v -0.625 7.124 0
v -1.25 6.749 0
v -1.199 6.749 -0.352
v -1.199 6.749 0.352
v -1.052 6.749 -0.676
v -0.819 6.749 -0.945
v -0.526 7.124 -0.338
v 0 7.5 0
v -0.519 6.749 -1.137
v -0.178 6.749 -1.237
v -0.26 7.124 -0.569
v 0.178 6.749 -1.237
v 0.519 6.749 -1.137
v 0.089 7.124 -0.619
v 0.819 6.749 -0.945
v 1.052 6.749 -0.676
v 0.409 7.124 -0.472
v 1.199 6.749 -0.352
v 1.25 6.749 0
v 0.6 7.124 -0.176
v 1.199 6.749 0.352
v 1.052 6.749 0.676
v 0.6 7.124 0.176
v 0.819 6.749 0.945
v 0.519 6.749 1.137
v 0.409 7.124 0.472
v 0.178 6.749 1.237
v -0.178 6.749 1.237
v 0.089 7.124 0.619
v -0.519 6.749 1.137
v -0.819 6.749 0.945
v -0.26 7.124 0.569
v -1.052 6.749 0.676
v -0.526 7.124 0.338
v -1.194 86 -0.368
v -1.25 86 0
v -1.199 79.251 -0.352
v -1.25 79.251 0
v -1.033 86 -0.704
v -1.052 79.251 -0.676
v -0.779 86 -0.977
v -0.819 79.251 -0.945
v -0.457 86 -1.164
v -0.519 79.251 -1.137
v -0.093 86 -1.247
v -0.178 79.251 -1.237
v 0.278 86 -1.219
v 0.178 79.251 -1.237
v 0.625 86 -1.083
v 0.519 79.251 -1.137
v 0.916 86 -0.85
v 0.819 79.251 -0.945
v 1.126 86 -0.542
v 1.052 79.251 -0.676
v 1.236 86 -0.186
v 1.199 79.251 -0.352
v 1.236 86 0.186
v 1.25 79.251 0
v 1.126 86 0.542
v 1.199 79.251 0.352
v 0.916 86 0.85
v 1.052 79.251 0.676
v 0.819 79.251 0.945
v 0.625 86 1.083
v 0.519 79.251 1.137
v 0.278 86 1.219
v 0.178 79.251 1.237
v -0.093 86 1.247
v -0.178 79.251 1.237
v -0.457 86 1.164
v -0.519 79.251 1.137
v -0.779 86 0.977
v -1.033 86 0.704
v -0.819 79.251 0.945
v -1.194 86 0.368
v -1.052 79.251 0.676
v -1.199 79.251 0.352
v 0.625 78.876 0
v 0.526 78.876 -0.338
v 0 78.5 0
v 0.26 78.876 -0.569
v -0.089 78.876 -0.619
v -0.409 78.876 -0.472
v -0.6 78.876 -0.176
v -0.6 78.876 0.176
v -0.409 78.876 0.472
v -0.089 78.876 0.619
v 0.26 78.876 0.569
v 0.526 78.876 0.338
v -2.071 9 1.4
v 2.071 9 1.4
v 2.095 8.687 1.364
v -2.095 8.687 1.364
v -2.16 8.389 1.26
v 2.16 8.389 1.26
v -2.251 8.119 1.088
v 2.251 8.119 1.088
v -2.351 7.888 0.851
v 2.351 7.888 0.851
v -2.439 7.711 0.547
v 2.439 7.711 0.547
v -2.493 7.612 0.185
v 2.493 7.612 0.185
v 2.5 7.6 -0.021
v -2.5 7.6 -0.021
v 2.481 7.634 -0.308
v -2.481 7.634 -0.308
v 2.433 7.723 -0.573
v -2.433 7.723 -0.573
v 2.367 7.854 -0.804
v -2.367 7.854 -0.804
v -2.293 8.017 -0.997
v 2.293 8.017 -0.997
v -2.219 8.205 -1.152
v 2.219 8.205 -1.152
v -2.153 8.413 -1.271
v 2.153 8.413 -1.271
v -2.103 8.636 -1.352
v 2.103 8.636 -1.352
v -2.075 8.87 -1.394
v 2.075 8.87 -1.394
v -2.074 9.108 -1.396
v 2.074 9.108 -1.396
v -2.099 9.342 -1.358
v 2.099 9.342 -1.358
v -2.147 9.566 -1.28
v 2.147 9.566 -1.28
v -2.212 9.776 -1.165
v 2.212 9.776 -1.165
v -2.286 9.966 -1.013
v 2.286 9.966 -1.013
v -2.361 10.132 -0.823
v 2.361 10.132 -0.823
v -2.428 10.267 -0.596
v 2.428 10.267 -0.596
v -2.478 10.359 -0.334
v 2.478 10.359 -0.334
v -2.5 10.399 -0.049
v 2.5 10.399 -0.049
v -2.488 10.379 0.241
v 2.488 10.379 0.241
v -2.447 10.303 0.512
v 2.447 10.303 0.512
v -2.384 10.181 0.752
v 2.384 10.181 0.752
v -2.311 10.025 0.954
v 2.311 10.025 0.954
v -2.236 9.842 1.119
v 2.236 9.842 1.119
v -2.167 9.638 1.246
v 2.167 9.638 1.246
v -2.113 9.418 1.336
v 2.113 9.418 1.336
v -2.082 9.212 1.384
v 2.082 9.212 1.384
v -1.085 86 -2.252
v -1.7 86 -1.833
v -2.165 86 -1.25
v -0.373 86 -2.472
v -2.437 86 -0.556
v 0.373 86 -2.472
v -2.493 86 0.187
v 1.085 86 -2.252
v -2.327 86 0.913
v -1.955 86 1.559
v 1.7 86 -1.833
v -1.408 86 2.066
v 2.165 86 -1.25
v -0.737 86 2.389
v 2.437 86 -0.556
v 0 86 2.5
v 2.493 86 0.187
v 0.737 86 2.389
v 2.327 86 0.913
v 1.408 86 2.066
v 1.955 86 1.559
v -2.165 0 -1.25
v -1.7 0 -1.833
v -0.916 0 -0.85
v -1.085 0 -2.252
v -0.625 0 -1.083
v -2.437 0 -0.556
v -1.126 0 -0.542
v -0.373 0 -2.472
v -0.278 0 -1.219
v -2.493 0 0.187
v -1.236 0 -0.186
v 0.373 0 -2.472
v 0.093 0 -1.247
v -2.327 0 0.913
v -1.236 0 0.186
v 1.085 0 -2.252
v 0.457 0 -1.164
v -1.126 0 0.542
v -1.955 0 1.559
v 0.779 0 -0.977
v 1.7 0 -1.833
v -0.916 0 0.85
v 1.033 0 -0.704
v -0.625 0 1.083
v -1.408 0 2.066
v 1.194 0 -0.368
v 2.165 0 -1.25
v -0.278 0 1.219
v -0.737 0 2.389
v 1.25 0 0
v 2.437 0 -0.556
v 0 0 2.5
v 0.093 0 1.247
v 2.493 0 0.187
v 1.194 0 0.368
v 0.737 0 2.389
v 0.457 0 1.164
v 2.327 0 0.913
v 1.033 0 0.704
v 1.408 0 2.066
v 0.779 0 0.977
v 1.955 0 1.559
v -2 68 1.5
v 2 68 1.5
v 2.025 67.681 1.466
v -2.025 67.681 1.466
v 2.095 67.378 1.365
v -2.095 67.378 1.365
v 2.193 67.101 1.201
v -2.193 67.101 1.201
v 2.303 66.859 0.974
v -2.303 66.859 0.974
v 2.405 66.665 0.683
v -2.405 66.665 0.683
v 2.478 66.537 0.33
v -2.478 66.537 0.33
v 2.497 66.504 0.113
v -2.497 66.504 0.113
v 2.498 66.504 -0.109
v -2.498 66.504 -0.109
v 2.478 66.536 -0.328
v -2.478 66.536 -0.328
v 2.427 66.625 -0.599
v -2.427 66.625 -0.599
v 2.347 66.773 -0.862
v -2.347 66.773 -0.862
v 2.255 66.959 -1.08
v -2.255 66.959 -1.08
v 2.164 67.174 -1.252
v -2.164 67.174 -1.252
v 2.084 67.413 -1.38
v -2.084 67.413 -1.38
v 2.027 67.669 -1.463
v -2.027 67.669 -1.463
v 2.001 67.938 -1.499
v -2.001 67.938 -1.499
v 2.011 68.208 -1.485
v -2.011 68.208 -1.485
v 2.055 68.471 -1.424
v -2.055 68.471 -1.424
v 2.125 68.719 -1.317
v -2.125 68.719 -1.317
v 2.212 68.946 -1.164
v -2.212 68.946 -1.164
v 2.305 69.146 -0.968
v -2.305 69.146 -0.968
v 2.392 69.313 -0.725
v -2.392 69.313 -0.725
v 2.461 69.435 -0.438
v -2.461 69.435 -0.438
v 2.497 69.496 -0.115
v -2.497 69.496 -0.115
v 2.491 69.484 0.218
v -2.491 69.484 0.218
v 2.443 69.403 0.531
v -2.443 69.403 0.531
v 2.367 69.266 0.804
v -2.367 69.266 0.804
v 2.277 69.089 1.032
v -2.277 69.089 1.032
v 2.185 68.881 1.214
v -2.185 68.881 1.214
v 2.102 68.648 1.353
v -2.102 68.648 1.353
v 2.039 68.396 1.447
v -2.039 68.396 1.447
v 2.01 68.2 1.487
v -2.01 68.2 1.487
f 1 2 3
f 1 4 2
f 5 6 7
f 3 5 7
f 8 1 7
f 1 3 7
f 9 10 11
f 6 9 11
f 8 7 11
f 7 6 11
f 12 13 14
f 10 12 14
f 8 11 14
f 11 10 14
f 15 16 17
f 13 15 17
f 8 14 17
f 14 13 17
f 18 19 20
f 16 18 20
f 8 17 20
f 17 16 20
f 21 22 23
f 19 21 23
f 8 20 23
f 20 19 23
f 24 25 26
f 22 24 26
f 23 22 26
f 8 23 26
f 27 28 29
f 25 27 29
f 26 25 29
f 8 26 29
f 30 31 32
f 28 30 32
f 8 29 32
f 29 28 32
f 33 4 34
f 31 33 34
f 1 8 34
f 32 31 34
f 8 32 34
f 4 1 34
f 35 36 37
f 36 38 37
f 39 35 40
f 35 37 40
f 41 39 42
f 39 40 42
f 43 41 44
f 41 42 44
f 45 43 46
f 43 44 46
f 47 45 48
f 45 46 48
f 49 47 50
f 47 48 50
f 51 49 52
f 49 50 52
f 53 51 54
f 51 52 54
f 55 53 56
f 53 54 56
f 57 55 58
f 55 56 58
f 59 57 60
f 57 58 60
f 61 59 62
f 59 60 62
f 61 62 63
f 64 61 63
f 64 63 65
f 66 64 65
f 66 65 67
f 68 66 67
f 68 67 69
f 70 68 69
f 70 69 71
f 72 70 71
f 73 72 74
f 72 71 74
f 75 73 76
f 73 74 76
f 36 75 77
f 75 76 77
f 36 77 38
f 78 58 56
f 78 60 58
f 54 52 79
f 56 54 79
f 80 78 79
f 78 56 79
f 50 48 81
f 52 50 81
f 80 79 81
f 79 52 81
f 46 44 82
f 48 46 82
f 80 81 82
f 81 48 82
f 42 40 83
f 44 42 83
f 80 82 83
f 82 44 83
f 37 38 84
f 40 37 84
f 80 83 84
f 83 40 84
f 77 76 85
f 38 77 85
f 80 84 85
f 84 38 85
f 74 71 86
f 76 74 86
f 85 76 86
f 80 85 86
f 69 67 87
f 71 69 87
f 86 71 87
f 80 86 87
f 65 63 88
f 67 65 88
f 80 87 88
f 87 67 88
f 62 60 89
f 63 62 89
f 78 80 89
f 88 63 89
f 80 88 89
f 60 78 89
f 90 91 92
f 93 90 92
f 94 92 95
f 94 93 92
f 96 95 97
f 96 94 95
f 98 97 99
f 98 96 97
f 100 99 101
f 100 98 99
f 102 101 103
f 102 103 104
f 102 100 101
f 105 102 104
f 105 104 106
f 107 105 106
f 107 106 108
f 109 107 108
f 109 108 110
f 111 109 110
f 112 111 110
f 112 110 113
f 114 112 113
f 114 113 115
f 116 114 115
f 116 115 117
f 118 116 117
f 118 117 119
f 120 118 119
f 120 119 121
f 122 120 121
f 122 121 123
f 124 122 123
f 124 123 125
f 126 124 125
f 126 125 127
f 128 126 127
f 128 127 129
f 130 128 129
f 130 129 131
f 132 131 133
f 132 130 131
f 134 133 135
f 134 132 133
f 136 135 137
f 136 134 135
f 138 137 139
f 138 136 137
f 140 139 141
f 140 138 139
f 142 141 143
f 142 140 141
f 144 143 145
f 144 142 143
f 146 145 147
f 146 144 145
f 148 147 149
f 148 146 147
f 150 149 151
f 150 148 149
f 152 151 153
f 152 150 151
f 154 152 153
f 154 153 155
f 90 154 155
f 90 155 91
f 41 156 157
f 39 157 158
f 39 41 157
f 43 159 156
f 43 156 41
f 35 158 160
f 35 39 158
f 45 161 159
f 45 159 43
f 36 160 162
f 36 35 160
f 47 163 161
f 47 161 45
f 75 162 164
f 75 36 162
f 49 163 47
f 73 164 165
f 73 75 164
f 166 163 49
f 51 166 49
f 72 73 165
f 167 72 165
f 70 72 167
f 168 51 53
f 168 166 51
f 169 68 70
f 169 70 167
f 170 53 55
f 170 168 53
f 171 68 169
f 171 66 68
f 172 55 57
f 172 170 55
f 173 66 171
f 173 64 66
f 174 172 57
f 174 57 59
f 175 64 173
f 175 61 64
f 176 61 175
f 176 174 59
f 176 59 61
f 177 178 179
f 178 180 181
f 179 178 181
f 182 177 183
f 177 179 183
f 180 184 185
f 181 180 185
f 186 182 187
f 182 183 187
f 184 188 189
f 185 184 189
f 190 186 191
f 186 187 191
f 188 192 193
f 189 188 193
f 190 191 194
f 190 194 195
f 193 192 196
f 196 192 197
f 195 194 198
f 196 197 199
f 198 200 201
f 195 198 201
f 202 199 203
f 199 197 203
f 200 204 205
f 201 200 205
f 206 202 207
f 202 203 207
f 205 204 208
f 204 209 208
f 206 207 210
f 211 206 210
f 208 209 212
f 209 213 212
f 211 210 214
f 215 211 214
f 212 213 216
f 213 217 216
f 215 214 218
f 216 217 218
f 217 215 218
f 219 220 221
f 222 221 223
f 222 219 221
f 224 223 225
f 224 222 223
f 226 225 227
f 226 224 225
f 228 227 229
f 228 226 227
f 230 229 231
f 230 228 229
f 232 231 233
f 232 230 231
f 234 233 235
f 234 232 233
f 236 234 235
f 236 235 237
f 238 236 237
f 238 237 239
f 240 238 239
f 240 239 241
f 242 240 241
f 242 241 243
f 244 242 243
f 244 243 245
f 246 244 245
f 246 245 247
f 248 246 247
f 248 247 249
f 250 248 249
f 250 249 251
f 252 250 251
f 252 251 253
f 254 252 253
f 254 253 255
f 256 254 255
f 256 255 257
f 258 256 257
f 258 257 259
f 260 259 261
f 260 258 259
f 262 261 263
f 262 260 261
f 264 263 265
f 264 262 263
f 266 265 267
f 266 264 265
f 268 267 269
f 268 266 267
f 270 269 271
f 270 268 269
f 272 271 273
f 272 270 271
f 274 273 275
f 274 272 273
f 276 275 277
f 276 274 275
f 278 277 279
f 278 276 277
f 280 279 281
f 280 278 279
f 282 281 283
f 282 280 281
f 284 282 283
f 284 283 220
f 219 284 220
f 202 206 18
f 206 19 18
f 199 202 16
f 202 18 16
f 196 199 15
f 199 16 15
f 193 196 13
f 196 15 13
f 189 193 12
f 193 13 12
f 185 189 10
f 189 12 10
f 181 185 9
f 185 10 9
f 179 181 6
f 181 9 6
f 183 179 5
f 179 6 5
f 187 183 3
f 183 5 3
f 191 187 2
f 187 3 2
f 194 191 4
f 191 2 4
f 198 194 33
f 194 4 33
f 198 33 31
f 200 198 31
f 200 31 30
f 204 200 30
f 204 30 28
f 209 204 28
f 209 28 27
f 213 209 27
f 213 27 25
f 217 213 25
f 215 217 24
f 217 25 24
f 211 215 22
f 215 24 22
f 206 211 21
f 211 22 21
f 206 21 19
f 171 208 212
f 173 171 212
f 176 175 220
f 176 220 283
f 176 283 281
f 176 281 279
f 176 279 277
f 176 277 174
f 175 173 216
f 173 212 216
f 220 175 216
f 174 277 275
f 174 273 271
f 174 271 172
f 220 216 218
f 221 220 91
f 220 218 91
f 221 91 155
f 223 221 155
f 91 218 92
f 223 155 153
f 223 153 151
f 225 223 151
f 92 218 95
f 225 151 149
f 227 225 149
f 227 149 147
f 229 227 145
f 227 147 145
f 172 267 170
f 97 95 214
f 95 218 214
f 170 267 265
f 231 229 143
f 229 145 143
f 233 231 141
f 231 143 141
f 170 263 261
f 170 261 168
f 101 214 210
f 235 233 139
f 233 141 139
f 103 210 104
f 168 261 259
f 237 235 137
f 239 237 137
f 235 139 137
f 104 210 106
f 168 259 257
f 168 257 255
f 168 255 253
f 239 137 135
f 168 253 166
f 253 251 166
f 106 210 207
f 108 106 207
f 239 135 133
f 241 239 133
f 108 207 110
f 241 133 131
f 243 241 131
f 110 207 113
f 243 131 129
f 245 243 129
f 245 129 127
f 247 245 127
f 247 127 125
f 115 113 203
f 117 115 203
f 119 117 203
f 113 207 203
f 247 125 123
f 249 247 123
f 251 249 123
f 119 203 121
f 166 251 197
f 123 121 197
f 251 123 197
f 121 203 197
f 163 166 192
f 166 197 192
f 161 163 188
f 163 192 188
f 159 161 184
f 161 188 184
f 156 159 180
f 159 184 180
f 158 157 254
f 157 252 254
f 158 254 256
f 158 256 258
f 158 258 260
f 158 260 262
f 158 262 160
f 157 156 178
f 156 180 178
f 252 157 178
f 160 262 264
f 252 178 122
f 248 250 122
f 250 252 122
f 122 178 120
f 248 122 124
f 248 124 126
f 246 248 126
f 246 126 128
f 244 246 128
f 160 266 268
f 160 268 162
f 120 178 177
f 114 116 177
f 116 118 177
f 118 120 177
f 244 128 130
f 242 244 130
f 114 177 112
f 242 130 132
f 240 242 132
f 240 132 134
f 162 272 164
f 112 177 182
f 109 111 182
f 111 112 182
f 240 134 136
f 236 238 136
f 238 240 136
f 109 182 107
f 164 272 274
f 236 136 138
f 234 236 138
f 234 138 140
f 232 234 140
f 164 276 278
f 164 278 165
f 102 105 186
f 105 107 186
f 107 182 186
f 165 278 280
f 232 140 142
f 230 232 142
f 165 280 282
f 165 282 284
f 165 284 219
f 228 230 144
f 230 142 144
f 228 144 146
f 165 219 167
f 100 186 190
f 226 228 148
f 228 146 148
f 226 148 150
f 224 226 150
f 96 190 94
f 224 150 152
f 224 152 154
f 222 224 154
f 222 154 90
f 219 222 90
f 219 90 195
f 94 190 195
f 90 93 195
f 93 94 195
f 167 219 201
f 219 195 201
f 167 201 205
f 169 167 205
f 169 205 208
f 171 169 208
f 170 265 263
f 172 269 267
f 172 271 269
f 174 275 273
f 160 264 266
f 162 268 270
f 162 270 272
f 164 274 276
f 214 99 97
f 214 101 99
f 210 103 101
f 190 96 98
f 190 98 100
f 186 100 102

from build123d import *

# Parameters (mm, degrees)
SKETCH_1_R               = 2.5
EXTRUDE_1_DEPTH          = 86
HOLE_WIZARD_M3_1_D       = 2.5
HOLE_WIZARD_M3_1_DEPTH   = 6.748924226
HOLE_WIZARD_M3_1_TIP     = 0.751075774
HOLE_WIZARD_M3_2_D       = 2.5
HOLE_WIZARD_M3_2_DEPTH   = 6.748924226
HOLE_WIZARD_M3_2_TIP     = 0.751075774
CUT_EXTRUDE_2_DEPTH      = 5
CUT_EXTRUDE_2_DEPTH_BACK = 5
SKETCH_10_R              = 1.5
SKETCH_10_R_2            = 1.4


with BuildPart() as part:
    # 草图1 → 凸台-拉伸1 (new body)
    with BuildSketch(Plane(origin=(0, 0, 0), x_dir=(1, 0, 0), z_dir=(0, 1, 0))):
        Circle(SKETCH_1_R)
    extrude(amount=EXTRUDE_1_DEPTH)

    # M3 螺纹孔1
    with Locations(Plane(origin=(0, 0, 0), x_dir=(-1, 0, 0), z_dir=(0, -1, 0))):
        with Locations((0, 0)):
            Hole(HOLE_WIZARD_M3_1_D / 2, depth=HOLE_WIZARD_M3_1_DEPTH)
            with Locations((0, 0, -(HOLE_WIZARD_M3_1_DEPTH + HOLE_WIZARD_M3_1_TIP / 2))):  # 118° drill point
                Cone(0, HOLE_WIZARD_M3_1_D / 2, HOLE_WIZARD_M3_1_TIP, mode=Mode.SUBTRACT)

    # M3 螺纹孔2
    with Locations(Plane(origin=(0, 86, 0), x_dir=(1, 0, 0), z_dir=(0, 1, 0))):
        with Locations((0, 0)):
            Hole(HOLE_WIZARD_M3_2_D / 2, depth=HOLE_WIZARD_M3_2_DEPTH)
            with Locations((0, 0, -(HOLE_WIZARD_M3_2_DEPTH + HOLE_WIZARD_M3_2_TIP / 2))):  # 118° drill point
                Cone(0, HOLE_WIZARD_M3_2_D / 2, HOLE_WIZARD_M3_2_TIP, mode=Mode.SUBTRACT)

    # 草图10 → 切除-拉伸2 (cut, two sides: drawn at the far end of the back side and taken through both)
    with BuildSketch(Plane(origin=(0, 0, 0), x_dir=(0, 0, -1), z_dir=(1, 0, 0)).offset(-CUT_EXTRUDE_2_DEPTH_BACK)):
        with Locations((0, 68)):
            Circle(SKETCH_10_R)
        with Locations((0, 9)):
            Circle(SKETCH_10_R_2)
    extrude(amount=CUT_EXTRUDE_2_DEPTH + CUT_EXTRUDE_2_DEPTH_BACK, mode=Mode.SUBTRACT)


solid = part.part
